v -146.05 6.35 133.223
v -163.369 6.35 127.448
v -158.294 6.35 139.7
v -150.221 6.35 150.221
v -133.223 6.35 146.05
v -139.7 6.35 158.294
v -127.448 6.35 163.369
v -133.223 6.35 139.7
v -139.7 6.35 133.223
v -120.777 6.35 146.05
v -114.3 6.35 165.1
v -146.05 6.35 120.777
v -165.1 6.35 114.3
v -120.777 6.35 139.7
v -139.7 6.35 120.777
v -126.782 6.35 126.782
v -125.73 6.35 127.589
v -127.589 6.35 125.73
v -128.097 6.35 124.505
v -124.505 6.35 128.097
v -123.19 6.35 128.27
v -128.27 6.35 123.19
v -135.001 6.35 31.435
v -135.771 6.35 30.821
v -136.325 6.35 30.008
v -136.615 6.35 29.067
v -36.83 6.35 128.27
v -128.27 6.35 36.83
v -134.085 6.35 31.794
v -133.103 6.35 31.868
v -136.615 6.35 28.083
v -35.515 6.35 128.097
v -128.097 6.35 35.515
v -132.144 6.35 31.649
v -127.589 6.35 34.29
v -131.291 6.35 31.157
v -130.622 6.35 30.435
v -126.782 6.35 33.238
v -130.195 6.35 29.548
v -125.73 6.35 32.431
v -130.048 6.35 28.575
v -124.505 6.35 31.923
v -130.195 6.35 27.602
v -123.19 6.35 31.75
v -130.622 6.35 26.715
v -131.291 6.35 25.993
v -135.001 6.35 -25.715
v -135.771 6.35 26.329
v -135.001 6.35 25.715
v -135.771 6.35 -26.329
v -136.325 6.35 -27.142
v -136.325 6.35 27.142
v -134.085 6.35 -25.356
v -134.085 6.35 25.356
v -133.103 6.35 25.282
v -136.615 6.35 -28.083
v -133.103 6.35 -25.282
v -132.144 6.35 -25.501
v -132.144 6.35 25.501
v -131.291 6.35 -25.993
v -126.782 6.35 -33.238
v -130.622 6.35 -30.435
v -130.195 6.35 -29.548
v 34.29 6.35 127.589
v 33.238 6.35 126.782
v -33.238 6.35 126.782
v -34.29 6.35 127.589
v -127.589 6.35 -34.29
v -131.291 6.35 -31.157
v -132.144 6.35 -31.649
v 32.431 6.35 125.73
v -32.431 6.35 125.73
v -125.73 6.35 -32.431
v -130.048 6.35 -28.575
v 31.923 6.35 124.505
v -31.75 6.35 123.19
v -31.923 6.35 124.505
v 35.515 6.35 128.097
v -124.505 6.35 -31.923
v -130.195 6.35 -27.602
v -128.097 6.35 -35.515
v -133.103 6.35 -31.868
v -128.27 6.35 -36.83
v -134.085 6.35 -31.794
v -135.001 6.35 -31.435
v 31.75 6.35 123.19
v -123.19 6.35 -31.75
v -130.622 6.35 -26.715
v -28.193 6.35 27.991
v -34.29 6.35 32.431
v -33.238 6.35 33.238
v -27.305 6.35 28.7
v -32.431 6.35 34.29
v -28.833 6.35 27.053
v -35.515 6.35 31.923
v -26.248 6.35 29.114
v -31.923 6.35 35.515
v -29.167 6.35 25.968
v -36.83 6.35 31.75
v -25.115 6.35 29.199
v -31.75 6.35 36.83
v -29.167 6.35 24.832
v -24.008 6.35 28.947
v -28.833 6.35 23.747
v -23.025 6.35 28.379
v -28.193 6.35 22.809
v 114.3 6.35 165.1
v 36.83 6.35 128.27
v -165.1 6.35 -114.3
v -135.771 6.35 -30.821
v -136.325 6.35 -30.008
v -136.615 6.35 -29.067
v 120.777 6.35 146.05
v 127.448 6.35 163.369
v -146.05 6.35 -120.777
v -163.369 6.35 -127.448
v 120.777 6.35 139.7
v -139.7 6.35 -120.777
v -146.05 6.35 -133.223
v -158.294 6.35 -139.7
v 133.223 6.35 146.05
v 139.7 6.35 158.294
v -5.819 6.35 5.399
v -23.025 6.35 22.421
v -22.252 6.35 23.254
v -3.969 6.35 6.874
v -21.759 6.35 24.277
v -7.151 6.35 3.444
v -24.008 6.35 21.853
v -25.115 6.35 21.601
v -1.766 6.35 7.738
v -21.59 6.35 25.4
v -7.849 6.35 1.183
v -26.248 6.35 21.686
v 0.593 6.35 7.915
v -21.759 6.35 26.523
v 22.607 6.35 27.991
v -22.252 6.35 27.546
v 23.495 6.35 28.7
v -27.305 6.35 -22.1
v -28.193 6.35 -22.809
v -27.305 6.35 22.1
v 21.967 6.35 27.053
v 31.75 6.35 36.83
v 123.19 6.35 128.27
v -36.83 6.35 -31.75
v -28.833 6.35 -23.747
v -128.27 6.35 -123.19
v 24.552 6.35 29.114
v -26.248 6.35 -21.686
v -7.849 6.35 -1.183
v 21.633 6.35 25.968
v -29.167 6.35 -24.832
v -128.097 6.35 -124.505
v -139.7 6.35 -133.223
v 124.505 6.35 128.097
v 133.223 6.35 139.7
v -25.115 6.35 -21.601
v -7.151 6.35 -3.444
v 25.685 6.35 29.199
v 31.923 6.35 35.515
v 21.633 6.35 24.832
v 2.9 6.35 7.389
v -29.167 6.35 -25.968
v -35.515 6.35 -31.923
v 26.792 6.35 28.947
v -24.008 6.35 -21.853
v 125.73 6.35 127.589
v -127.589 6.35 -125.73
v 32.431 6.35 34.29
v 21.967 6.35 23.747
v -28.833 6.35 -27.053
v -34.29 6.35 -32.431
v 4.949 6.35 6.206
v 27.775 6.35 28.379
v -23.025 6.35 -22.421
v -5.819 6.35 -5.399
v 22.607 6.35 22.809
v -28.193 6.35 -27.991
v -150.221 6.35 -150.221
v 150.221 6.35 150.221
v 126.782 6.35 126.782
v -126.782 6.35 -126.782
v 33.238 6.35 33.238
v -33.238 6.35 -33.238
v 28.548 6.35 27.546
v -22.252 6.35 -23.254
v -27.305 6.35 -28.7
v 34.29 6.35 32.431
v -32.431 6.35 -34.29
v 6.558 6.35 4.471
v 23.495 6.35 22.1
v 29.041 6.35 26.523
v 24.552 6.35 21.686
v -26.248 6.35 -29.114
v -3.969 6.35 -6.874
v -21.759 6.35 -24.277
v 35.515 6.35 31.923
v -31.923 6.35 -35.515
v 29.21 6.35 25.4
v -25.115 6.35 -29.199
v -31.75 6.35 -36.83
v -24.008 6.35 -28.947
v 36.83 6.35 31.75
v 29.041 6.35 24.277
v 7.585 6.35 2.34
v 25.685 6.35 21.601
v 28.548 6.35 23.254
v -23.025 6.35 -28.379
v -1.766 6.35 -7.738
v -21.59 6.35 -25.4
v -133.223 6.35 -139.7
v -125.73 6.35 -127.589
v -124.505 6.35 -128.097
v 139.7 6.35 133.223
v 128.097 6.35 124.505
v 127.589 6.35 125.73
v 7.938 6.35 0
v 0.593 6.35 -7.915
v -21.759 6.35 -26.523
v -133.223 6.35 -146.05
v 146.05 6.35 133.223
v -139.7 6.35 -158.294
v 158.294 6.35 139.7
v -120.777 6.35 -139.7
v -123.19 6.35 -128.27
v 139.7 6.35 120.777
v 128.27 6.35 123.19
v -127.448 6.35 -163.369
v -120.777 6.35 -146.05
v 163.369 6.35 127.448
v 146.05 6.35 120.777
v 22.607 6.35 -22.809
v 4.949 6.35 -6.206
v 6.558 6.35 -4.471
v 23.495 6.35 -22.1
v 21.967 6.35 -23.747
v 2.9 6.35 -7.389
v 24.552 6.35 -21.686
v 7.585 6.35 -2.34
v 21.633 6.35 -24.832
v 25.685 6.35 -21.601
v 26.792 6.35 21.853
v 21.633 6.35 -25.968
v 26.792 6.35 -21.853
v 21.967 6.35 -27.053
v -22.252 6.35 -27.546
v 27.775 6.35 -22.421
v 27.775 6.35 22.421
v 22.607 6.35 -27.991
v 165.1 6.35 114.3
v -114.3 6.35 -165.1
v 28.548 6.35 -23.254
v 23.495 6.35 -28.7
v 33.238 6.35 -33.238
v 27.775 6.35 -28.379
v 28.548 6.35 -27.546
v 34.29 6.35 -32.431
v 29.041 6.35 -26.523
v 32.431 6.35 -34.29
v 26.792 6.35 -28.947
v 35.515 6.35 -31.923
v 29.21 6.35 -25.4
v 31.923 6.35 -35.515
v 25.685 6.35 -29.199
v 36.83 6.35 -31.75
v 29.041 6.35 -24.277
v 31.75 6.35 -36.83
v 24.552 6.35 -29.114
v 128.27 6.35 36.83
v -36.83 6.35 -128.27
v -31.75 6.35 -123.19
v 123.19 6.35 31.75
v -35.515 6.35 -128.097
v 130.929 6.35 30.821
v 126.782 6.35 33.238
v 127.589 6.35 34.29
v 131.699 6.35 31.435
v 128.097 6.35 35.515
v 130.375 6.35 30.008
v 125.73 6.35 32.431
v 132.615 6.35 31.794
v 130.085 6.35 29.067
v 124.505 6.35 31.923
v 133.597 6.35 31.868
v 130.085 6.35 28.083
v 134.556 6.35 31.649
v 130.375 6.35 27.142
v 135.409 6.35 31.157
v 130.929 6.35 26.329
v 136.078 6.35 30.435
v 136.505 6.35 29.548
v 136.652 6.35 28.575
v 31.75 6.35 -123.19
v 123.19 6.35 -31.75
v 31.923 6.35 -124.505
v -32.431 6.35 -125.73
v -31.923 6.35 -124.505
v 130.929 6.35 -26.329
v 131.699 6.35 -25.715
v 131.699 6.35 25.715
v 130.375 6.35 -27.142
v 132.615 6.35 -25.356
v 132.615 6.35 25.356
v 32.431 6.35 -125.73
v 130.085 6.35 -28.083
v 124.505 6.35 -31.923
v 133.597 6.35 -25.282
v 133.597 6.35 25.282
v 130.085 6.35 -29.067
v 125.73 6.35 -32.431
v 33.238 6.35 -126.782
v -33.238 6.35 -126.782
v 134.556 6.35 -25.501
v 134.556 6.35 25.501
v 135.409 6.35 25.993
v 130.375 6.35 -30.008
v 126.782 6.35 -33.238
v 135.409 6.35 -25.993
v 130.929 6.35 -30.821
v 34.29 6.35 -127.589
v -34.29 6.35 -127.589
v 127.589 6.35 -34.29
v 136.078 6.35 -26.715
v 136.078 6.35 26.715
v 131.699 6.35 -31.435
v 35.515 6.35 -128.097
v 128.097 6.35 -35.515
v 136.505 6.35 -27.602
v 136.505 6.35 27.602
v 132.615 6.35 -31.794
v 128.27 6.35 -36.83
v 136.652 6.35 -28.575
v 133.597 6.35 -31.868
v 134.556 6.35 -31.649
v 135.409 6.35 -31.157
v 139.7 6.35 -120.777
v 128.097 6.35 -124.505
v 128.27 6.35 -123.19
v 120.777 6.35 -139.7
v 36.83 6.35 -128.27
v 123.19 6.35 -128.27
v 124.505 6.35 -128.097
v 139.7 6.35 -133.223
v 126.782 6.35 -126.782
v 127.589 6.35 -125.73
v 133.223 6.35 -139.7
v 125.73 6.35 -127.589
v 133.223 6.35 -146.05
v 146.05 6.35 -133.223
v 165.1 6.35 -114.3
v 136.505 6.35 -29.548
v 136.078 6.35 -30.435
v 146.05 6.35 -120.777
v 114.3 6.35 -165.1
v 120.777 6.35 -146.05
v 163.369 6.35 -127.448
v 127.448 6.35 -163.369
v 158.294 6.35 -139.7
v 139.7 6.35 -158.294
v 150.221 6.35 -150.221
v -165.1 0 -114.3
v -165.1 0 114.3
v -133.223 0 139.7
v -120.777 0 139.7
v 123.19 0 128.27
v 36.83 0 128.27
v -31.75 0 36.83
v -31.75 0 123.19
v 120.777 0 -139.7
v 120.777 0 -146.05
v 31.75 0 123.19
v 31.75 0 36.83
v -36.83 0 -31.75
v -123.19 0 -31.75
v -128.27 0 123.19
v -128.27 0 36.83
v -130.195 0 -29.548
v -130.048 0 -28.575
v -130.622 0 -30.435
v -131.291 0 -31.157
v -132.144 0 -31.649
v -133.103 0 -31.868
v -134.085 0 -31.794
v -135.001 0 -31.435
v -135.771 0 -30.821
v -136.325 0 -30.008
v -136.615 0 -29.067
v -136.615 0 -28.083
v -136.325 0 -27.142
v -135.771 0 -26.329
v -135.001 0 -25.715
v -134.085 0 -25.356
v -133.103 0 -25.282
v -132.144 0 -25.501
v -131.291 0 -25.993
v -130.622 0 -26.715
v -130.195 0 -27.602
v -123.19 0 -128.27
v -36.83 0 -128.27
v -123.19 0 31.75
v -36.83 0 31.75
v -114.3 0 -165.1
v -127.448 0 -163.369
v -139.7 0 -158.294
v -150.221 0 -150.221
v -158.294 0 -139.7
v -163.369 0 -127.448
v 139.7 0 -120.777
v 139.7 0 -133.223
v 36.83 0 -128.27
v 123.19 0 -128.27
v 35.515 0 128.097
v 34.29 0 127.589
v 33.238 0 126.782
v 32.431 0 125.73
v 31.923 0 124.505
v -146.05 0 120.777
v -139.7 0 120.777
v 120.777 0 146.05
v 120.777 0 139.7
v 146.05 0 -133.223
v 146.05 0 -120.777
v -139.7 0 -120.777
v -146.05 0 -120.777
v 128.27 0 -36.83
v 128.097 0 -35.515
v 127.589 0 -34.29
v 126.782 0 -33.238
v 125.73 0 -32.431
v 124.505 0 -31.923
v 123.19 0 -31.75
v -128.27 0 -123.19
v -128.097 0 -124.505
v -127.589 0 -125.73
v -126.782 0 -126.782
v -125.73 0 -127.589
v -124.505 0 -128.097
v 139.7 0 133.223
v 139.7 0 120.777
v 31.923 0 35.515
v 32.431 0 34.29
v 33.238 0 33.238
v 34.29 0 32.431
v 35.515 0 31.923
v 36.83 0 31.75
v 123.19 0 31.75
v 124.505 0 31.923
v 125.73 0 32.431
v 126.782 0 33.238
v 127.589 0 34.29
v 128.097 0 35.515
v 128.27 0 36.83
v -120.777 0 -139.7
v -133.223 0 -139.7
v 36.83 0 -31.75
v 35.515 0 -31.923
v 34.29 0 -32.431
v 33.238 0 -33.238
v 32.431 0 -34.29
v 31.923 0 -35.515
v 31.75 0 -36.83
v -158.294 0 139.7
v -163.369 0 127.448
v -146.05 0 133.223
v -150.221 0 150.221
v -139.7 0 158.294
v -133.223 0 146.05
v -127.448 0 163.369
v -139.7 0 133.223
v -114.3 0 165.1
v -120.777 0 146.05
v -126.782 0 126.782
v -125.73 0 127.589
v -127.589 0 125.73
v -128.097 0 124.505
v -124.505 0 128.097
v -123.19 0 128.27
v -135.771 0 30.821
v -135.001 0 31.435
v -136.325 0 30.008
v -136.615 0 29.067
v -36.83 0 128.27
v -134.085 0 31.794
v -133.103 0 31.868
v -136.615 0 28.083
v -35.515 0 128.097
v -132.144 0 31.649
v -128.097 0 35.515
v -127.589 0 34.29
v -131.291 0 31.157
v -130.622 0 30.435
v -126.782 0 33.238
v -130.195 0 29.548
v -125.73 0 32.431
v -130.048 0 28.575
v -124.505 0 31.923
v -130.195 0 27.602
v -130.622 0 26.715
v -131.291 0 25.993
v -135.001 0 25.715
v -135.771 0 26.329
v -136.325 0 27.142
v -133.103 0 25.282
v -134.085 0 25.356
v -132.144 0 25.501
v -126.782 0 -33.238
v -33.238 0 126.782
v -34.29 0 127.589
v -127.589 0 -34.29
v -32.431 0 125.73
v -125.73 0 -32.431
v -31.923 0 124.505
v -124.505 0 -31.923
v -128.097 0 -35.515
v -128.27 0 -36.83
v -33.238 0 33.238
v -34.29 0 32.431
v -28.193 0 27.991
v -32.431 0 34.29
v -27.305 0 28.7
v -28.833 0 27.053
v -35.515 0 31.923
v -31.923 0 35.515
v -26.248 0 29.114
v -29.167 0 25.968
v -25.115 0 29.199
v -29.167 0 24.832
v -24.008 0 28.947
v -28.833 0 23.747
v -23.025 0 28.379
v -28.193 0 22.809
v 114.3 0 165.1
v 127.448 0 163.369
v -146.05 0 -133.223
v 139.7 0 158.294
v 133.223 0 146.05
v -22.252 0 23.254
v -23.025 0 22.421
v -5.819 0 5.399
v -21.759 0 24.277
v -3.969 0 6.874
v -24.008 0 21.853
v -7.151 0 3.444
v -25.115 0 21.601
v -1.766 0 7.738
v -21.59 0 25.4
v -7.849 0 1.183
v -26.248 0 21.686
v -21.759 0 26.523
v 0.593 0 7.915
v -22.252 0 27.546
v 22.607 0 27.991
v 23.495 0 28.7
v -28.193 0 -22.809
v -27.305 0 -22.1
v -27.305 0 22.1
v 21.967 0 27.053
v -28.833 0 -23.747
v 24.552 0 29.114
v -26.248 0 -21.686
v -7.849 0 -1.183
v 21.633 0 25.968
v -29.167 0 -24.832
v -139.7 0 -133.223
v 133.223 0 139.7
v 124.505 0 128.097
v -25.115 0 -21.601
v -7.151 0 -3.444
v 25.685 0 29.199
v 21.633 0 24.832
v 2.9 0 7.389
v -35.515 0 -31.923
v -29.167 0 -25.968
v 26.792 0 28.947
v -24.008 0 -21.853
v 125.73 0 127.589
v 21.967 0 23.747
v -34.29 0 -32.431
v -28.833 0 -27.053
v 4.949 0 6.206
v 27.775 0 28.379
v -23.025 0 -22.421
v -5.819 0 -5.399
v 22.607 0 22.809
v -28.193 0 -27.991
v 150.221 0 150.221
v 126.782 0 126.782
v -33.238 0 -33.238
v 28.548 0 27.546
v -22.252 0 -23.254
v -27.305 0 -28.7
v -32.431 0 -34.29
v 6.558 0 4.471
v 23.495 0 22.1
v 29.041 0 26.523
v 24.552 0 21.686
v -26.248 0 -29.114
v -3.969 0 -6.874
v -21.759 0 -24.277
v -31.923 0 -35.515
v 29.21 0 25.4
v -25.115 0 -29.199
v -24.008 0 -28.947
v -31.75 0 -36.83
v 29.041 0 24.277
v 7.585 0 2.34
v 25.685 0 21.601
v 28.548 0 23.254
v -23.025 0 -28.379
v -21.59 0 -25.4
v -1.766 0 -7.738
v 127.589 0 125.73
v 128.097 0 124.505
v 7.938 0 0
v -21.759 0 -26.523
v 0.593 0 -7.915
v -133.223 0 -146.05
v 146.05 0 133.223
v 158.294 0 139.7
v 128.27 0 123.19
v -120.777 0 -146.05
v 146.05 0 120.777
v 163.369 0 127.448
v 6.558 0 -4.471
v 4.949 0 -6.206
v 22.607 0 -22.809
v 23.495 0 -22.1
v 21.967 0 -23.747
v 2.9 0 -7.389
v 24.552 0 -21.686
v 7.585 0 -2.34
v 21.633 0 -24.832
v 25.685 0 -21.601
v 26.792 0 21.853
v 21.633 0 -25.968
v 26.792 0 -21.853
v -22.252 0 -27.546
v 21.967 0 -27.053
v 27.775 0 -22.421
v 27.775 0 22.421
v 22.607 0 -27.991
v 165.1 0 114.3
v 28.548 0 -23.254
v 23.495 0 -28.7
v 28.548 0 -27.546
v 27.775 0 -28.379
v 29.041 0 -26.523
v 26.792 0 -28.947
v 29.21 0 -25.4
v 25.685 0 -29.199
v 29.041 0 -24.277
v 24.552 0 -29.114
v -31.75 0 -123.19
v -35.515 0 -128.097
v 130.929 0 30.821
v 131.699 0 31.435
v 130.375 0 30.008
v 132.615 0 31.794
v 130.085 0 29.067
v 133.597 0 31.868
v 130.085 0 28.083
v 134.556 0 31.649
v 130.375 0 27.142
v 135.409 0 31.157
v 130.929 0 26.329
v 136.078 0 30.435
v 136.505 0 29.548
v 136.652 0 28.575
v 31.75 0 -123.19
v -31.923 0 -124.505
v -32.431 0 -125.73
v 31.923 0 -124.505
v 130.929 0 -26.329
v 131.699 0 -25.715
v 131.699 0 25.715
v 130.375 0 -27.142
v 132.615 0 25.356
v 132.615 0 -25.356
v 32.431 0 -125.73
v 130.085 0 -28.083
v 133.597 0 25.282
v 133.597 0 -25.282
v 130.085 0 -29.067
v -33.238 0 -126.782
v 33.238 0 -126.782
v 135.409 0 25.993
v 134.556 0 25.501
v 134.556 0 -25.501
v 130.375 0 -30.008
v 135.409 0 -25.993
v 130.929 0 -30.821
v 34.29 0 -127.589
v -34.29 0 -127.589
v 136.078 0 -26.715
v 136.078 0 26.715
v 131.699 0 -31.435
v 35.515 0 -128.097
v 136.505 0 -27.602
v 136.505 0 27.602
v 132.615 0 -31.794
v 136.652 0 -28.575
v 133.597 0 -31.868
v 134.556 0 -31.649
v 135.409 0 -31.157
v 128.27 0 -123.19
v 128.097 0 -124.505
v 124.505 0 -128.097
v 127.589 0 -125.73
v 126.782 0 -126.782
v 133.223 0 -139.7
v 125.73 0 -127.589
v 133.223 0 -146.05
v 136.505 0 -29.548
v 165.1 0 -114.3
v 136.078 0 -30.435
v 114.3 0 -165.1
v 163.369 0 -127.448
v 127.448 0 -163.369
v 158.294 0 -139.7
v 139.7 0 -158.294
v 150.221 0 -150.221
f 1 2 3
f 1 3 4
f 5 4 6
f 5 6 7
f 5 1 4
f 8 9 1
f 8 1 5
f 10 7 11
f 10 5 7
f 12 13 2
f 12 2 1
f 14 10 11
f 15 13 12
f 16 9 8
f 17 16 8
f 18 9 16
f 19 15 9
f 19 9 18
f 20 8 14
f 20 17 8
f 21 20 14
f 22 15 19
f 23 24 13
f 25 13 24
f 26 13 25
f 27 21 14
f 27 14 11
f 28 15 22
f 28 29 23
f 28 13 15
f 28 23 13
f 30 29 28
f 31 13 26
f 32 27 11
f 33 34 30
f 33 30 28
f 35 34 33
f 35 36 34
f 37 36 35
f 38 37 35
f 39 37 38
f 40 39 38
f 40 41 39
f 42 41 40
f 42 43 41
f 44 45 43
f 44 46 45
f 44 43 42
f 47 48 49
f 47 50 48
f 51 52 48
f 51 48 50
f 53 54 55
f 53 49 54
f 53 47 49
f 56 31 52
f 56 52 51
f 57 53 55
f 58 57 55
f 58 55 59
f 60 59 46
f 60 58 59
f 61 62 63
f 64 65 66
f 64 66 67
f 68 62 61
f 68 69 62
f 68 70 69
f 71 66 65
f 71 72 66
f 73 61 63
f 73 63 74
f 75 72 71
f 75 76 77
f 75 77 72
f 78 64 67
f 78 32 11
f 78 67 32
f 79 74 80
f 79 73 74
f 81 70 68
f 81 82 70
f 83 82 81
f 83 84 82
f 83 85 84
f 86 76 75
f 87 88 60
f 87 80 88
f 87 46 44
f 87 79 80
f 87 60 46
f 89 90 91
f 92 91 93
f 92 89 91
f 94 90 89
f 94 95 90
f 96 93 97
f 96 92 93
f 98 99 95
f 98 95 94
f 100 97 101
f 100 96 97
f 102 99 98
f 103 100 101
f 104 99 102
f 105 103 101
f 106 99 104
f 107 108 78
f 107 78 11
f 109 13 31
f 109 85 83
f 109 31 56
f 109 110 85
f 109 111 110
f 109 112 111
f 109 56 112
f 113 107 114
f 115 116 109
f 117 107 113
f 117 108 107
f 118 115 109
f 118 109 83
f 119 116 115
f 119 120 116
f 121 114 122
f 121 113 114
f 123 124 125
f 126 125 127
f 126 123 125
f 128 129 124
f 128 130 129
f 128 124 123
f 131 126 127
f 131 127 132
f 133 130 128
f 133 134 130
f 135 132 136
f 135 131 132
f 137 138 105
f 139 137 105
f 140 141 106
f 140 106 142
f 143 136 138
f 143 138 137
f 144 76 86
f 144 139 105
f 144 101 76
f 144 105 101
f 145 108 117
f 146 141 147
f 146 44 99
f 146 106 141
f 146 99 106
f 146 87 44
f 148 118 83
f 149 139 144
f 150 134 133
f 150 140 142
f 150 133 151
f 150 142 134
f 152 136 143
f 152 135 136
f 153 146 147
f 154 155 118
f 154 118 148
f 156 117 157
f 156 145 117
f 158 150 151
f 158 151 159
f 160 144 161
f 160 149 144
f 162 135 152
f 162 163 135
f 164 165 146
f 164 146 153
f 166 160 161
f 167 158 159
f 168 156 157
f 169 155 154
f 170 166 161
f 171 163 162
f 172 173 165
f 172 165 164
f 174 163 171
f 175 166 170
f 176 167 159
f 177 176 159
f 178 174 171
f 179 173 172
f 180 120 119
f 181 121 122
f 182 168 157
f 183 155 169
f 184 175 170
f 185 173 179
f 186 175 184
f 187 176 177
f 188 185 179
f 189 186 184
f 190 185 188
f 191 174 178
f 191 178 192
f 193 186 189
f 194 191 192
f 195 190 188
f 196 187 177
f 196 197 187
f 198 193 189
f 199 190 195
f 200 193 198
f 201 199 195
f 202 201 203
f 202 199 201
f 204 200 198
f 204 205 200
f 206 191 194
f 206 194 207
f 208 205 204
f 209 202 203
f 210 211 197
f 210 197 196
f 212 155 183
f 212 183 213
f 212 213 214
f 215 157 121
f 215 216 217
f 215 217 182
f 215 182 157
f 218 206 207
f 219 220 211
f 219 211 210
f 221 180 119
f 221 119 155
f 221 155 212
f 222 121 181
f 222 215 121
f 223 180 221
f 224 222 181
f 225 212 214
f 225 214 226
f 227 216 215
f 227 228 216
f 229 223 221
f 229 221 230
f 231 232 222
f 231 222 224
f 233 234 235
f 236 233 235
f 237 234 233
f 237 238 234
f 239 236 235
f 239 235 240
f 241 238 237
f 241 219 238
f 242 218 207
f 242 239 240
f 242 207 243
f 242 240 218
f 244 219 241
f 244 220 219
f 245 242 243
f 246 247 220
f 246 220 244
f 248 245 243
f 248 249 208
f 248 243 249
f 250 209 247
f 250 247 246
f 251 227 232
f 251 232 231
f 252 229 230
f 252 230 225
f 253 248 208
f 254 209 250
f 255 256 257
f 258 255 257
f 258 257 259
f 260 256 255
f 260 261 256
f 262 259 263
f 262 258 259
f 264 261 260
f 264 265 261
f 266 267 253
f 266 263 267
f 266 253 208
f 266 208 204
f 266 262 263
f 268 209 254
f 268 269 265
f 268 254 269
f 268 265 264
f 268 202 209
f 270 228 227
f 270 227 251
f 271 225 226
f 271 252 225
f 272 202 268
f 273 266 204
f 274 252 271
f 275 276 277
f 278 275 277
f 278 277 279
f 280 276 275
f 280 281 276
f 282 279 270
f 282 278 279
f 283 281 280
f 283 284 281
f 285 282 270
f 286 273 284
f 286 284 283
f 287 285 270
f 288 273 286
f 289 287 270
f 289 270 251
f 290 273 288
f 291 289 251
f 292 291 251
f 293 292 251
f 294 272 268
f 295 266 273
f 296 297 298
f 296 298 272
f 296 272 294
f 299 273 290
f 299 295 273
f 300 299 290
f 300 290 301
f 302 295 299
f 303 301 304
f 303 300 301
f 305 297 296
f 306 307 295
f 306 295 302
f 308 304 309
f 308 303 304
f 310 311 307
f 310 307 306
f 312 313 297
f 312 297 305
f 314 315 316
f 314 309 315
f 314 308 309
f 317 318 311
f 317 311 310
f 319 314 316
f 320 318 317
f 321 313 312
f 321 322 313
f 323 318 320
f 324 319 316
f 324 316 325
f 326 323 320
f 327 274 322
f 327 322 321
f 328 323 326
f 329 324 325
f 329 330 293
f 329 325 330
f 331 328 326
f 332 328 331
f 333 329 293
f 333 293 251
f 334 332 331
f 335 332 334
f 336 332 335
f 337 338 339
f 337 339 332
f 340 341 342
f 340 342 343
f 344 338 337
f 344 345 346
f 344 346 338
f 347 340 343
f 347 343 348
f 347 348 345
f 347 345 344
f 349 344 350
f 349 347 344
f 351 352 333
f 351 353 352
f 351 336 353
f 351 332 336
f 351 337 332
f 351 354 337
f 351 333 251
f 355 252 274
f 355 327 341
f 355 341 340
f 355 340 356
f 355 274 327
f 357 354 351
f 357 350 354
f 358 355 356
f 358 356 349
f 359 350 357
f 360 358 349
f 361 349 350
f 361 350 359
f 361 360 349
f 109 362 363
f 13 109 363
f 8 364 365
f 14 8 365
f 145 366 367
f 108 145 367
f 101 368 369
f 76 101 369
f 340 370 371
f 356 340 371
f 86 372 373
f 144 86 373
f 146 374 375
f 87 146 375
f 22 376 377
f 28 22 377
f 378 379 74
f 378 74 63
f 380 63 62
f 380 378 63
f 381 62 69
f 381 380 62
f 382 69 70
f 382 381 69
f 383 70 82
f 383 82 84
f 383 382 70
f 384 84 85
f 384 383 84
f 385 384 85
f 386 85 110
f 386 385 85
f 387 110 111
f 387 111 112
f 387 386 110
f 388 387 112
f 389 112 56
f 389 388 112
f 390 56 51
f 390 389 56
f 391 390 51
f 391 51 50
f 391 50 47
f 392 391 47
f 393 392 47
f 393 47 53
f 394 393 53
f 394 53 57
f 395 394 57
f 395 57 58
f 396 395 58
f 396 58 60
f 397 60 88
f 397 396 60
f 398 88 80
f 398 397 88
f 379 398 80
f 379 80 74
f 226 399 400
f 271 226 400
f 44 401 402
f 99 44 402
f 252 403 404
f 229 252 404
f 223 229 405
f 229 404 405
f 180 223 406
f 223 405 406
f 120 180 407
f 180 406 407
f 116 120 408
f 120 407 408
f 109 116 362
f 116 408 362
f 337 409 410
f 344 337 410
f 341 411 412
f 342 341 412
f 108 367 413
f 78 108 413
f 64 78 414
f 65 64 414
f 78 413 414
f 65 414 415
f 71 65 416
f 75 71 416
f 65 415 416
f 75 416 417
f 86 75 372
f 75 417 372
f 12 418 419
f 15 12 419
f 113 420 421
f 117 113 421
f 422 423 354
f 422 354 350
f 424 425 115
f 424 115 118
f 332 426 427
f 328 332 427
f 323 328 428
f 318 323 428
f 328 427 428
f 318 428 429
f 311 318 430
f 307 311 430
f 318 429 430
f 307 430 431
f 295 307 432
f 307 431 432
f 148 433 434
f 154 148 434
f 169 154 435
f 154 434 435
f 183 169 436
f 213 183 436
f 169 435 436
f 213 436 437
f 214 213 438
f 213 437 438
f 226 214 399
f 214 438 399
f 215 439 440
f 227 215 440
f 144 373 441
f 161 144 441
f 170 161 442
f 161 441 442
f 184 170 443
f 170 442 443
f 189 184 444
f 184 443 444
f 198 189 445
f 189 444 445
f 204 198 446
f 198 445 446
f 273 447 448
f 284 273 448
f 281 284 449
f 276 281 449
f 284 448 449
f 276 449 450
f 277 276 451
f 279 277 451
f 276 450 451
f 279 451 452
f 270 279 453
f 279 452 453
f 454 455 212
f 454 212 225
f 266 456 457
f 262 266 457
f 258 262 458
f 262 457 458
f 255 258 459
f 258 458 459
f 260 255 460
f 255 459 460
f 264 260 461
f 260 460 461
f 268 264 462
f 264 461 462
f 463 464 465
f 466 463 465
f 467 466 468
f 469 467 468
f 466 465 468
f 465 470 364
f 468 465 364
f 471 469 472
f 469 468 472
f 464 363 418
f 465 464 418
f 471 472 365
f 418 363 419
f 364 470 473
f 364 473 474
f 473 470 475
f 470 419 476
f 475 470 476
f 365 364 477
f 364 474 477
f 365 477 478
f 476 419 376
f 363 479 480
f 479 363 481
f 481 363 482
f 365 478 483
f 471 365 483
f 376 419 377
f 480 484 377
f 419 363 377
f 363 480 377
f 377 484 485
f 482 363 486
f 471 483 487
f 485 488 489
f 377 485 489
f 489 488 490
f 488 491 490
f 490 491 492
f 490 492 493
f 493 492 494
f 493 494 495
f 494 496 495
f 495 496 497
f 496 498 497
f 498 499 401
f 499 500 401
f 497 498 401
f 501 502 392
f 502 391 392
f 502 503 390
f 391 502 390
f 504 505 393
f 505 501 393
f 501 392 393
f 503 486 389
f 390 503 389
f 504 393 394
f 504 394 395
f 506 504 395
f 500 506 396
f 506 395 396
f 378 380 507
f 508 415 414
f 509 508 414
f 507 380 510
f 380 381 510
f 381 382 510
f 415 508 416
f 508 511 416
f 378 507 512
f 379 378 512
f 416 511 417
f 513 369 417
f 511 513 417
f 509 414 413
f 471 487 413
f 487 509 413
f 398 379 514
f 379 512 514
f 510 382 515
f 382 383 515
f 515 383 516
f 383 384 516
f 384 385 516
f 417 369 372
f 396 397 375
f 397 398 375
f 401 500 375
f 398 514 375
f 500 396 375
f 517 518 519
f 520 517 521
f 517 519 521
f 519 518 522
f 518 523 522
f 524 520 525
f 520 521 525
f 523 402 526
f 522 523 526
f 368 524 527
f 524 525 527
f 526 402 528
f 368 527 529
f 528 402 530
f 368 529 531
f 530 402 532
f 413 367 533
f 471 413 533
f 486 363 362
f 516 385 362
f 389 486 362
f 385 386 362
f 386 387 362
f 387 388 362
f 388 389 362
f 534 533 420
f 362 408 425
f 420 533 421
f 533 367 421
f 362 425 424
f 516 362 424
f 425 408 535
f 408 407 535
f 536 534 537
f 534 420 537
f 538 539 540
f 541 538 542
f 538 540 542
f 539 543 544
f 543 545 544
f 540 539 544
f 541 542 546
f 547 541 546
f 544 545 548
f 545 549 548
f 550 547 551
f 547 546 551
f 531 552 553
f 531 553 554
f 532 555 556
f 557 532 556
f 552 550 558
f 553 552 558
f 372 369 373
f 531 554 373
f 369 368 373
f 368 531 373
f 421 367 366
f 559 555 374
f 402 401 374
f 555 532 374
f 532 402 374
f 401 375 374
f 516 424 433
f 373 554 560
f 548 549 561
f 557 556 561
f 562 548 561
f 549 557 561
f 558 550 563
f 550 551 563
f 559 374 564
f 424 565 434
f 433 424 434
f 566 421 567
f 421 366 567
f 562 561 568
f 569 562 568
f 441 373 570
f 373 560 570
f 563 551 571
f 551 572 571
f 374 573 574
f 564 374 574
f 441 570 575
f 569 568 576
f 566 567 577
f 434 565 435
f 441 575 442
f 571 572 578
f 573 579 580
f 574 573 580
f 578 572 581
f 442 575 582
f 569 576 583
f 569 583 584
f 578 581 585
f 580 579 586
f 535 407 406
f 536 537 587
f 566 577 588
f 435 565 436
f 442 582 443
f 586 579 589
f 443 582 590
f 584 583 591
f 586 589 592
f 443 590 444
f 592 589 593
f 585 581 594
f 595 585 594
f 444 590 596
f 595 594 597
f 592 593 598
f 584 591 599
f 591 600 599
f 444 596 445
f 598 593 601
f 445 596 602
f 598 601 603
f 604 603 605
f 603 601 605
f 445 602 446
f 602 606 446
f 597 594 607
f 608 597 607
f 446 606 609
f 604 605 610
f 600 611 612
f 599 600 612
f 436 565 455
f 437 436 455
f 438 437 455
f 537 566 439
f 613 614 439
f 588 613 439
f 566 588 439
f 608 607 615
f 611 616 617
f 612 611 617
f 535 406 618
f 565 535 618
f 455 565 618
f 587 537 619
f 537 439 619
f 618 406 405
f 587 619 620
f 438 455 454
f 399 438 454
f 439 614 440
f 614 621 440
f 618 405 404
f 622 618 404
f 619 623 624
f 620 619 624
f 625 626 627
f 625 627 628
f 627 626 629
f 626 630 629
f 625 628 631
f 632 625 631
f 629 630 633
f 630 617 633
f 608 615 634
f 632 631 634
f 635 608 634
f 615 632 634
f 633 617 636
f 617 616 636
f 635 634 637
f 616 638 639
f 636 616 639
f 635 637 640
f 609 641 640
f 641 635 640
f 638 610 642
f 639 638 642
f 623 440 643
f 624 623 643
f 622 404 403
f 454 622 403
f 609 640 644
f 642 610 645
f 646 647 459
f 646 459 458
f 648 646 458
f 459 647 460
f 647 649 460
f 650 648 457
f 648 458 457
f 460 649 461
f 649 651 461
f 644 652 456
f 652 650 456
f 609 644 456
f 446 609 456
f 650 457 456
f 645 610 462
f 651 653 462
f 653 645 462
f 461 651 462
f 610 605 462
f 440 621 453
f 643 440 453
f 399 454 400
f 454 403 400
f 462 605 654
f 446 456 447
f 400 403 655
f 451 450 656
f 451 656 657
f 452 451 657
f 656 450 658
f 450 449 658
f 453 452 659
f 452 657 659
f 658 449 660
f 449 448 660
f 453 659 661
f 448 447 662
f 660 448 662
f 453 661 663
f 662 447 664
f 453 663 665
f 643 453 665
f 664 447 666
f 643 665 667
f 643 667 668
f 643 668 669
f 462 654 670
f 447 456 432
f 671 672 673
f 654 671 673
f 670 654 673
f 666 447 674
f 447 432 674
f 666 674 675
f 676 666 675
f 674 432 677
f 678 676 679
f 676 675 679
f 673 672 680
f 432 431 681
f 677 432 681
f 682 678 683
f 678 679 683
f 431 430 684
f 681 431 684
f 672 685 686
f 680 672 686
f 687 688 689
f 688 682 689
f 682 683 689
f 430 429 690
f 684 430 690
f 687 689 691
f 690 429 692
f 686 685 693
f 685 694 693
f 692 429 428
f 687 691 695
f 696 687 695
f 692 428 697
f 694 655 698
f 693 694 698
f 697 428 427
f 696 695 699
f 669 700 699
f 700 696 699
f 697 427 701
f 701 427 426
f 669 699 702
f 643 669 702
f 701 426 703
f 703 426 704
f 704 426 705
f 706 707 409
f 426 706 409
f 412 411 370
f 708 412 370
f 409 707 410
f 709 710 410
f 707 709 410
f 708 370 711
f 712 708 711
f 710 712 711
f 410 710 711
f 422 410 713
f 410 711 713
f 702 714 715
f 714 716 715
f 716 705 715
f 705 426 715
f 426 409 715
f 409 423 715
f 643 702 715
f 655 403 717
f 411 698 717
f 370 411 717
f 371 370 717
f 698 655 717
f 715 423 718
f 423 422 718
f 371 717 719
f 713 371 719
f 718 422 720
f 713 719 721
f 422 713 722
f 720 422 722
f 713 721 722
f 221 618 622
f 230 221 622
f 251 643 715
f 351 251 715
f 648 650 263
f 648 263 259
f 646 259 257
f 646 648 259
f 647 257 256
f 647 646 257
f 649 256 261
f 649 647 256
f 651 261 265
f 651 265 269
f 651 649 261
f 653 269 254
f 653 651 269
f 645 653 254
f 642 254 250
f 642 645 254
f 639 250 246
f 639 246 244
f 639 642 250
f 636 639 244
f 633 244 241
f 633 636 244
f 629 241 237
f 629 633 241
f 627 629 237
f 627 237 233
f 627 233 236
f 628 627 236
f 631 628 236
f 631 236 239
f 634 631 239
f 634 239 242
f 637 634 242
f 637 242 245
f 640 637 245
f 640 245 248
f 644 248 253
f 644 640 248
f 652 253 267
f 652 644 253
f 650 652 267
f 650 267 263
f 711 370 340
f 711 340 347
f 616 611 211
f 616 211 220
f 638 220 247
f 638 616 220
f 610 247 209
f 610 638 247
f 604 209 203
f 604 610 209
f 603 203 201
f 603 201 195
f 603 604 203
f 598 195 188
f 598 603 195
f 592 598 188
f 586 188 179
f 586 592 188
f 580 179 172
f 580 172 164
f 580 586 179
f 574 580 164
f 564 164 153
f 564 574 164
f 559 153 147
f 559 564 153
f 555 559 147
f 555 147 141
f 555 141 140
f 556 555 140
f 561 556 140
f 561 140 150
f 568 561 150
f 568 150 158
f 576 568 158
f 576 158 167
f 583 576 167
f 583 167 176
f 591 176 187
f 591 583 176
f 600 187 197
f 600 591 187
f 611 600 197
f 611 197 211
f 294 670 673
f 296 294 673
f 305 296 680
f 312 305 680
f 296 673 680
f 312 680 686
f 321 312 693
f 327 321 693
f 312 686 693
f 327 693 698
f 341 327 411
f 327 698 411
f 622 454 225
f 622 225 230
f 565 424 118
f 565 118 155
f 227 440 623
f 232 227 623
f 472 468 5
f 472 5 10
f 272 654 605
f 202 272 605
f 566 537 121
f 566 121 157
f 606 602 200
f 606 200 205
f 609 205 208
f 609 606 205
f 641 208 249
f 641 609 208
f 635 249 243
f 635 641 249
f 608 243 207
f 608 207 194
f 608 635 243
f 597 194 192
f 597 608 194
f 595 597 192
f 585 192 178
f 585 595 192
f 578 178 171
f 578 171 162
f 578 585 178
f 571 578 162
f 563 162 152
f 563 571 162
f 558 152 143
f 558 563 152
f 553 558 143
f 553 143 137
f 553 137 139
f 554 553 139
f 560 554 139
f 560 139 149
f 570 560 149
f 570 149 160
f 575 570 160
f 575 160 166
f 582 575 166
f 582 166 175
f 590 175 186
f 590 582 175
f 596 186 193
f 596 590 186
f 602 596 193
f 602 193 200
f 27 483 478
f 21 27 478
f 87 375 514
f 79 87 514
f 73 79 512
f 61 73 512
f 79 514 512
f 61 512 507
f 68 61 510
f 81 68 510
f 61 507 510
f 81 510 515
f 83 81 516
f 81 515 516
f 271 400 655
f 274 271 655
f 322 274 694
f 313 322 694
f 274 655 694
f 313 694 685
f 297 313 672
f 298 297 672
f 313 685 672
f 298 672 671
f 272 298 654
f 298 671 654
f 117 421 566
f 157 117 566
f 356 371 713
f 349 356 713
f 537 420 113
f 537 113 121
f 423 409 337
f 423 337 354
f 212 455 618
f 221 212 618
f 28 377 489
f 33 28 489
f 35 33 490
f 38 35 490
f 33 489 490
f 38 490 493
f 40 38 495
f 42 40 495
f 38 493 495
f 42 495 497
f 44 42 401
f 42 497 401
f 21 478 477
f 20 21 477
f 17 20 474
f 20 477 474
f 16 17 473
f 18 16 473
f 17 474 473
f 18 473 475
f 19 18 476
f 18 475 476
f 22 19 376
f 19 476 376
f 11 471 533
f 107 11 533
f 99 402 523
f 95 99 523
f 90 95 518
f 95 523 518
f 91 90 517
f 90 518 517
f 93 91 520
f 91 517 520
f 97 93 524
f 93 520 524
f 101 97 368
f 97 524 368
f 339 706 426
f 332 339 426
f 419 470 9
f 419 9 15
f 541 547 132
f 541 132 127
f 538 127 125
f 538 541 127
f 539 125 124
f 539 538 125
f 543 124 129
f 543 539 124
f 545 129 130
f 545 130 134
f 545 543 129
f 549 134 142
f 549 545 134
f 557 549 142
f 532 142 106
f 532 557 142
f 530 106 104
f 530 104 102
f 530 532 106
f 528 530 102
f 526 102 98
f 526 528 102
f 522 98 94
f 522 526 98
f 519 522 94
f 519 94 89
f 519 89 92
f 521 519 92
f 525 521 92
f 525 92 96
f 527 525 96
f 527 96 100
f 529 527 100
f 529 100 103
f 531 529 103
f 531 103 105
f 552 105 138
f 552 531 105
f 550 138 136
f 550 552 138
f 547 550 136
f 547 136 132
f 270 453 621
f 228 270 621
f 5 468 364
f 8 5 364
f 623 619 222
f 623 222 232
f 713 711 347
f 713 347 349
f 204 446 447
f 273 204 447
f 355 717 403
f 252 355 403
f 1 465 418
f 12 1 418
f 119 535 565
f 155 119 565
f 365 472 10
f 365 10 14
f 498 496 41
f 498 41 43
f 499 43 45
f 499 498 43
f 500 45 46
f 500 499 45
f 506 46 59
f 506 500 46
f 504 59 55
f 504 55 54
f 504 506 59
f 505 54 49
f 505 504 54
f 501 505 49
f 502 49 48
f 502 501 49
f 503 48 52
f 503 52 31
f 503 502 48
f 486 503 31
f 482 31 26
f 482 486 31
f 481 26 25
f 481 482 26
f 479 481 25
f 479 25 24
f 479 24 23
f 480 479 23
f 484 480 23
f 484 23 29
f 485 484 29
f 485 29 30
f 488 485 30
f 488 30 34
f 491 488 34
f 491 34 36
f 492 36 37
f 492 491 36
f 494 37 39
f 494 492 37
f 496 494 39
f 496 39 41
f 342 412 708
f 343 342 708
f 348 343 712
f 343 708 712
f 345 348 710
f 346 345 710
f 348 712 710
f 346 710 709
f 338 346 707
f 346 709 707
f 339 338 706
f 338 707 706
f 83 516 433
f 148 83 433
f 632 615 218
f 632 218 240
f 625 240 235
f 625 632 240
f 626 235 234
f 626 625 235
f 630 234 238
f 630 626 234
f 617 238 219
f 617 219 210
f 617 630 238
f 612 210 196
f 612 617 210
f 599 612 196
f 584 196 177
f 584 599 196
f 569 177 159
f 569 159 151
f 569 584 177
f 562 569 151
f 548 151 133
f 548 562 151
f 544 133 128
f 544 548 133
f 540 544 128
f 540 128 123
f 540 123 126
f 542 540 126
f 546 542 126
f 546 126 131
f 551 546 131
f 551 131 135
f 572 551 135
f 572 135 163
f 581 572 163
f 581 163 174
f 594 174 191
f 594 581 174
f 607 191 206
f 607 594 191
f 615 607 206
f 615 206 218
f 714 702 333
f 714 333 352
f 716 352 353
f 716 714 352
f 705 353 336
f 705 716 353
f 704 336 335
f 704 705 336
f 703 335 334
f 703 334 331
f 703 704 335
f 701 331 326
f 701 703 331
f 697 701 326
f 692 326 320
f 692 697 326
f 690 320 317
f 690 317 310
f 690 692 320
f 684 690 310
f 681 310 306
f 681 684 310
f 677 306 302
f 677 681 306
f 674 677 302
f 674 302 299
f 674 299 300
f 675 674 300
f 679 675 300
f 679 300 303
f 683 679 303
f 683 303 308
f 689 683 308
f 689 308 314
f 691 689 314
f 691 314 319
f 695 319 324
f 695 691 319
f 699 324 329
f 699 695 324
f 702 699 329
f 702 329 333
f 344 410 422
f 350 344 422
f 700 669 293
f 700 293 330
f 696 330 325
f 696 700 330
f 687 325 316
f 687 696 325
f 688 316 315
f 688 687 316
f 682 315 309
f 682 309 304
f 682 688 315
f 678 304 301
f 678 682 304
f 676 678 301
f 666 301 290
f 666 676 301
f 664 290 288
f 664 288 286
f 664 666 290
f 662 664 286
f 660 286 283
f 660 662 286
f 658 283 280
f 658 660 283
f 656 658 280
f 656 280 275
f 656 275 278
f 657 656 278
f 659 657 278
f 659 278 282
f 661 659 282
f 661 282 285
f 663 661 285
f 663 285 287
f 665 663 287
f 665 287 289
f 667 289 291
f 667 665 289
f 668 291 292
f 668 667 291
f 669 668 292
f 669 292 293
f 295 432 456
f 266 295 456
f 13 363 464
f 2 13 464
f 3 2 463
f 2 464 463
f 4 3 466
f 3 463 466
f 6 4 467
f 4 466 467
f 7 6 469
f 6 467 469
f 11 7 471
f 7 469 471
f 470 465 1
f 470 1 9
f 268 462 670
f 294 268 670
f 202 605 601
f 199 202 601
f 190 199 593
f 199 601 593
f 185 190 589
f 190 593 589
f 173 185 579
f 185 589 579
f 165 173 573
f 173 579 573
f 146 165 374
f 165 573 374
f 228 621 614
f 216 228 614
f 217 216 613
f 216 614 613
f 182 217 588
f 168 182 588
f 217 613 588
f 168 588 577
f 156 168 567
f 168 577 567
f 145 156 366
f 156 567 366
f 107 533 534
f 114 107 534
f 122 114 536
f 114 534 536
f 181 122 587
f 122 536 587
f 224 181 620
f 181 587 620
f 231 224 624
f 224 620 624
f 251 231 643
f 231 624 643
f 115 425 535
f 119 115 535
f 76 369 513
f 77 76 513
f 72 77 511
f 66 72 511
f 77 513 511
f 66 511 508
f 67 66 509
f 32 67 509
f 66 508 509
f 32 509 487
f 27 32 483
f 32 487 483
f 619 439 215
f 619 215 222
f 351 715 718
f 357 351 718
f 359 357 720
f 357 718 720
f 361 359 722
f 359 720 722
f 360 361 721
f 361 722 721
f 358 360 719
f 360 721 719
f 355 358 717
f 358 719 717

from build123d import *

# Parameters (mm, degrees)
SKETCH2_R           = 7.9375
SKETCH2_R_2         = 3.81
SKETCH2_R_3         = 3.302
SKETCH2_W           = 12.446
SKETCH2_H           = 6.35
SKETCH2_W_2         = 6.35
SKETCH2_H_2         = 12.446
BOSS_EXTRUDE1_DEPTH = 6.35


with BuildPart() as part:
    # Sketch2 → Boss-Extrude1 (new body)
    with BuildSketch(Plane(origin=(0, 0, 0), x_dir=(1, 0, 0), z_dir=(0, 1, 0))):
        with BuildLine():
            Line((-114.3, -165.1), (114.3, -165.1))
            ThreePointArc((114.3, -165.1), (150.221024484, -150.221024484), (165.1, -114.3))
            Line((165.1, -114.3), (165.1, 114.3))
            ThreePointArc((165.1, 114.3), (150.221024484, 150.221024484), (114.3, 165.1))
            Line((114.3, 165.1), (-114.3, 165.1))
            ThreePointArc((-114.3, 165.1), (-150.221024484, 150.221024484), (-165.1, 114.3))
            Line((-165.1, 114.3), (-165.1, -114.3))
            ThreePointArc((-165.1, -114.3), (-150.221024484, -150.221024484), (-114.3, -165.1))
        make_face()
        Circle(SKETCH2_R, mode=Mode.SUBTRACT)
        with Locations((25.4, -25.4)):
            Circle(SKETCH2_R_2, mode=Mode.SUBTRACT)
        with Locations((25.4, 25.4)):
            Circle(SKETCH2_R_2, mode=Mode.SUBTRACT)
        with Locations((-25.4, 25.4)):
            Circle(SKETCH2_R_2, mode=Mode.SUBTRACT)
        with Locations((-25.4, -25.4)):
            Circle(SKETCH2_R_2, mode=Mode.SUBTRACT)
        with Locations((133.35, -28.575)):
            Circle(SKETCH2_R_3, mode=Mode.SUBTRACT)
        with Locations((-133.35, -28.575)):
            Circle(SKETCH2_R_3, mode=Mode.SUBTRACT)
        with Locations((-133.35, 28.575)):
            Circle(SKETCH2_R_3, mode=Mode.SUBTRACT)
        with Locations((133.35, 28.575)):
            Circle(SKETCH2_R_3, mode=Mode.SUBTRACT)
        with BuildLine():
            Line((-123.19, 128.27), (-36.83, 128.27))
            ThreePointArc((-36.83, 128.27), (-33.237897552, 126.782102448), (-31.75, 123.19))
            Line((-31.75, 123.19), (-31.75, 36.83))
            ThreePointArc((-31.75, 36.83), (-33.237897552, 33.237897552), (-36.83, 31.75))
            Line((-36.83, 31.75), (-123.19, 31.75))
            ThreePointArc((-123.19, 31.75), (-126.782102448, 33.237897552), (-128.27, 36.83))
            Line((-128.27, 36.83), (-128.27, 123.19))
            ThreePointArc((-128.27, 123.19), (-126.782102448, 126.782102448), (-123.19, 128.27))
        make_face(mode=Mode.SUBTRACT)
        with BuildLine():
            Line((36.83, 128.27), (123.19, 128.27))
            ThreePointArc((123.19, 128.27), (126.782102448, 126.782102448), (128.27, 123.19))
            Line((128.27, 123.19), (128.27, 36.83))
            ThreePointArc((128.27, 36.83), (126.782102448, 33.237897552), (123.19, 31.75))
            Line((123.19, 31.75), (36.83, 31.75))
            ThreePointArc((36.83, 31.75), (33.237897552, 33.237897552), (31.75, 36.83))
            Line((31.75, 36.83), (31.75, 123.19))
            ThreePointArc((31.75, 123.19), (33.237897552, 126.782102448), (36.83, 128.27))
        make_face(mode=Mode.SUBTRACT)
        with BuildLine():
            Line((-123.19, -31.75), (-36.83, -31.75))
            ThreePointArc((-36.83, -31.75), (-33.237897552, -33.237897552), (-31.75, -36.83))
            Line((-31.75, -36.83), (-31.75, -123.19))
            ThreePointArc((-31.75, -123.19), (-33.237897552, -126.782102448), (-36.83, -128.27))
            Line((-36.83, -128.27), (-123.19, -128.27))
            ThreePointArc((-123.19, -128.27), (-126.782102448, -126.782102448), (-128.27, -123.19))
            Line((-128.27, -123.19), (-128.27, -36.83))
            ThreePointArc((-128.27, -36.83), (-126.782102448, -33.237897552), (-123.19, -31.75))
        make_face(mode=Mode.SUBTRACT)
        with BuildLine():
            Line((36.83, -31.75), (123.19, -31.75))
            ThreePointArc((123.19, -31.75), (126.782102448, -33.237897552), (128.27, -36.83))
            Line((128.27, -36.83), (128.27, -123.19))
            ThreePointArc((128.27, -123.19), (126.782102448, -126.782102448), (123.19, -128.27))
            Line((123.19, -128.27), (36.83, -128.27))
            ThreePointArc((36.83, -128.27), (33.237897552, -126.782102448), (31.75, -123.19))
            Line((31.75, -123.19), (31.75, -36.83))
            ThreePointArc((31.75, -36.83), (33.237897552, -33.237897552), (36.83, -31.75))
        make_face(mode=Mode.SUBTRACT)
        with Locations((-127, -142.875)):
            Rectangle(SKETCH2_W, SKETCH2_H, mode=Mode.SUBTRACT)
        with Locations((127, -142.875)):
            Rectangle(SKETCH2_W, SKETCH2_H, mode=Mode.SUBTRACT)
        with Locations((-142.875, 127)):
            Rectangle(SKETCH2_W_2, SKETCH2_H_2, mode=Mode.SUBTRACT)
        with Locations((-142.875, -127)):
            Rectangle(SKETCH2_W_2, SKETCH2_H_2, mode=Mode.SUBTRACT)
        with Locations((127, 142.875)):
            Rectangle(SKETCH2_W, SKETCH2_H, mode=Mode.SUBTRACT)
        with Locations((-127, 142.875)):
            Rectangle(SKETCH2_W, SKETCH2_H, mode=Mode.SUBTRACT)
        with Locations((142.875, -127)):
            Rectangle(SKETCH2_W_2, SKETCH2_H_2, mode=Mode.SUBTRACT)
        with Locations((142.875, 127)):
            Rectangle(SKETCH2_W_2, SKETCH2_H_2, mode=Mode.SUBTRACT)
    extrude(amount=BOSS_EXTRUDE1_DEPTH)


solid = part.part
